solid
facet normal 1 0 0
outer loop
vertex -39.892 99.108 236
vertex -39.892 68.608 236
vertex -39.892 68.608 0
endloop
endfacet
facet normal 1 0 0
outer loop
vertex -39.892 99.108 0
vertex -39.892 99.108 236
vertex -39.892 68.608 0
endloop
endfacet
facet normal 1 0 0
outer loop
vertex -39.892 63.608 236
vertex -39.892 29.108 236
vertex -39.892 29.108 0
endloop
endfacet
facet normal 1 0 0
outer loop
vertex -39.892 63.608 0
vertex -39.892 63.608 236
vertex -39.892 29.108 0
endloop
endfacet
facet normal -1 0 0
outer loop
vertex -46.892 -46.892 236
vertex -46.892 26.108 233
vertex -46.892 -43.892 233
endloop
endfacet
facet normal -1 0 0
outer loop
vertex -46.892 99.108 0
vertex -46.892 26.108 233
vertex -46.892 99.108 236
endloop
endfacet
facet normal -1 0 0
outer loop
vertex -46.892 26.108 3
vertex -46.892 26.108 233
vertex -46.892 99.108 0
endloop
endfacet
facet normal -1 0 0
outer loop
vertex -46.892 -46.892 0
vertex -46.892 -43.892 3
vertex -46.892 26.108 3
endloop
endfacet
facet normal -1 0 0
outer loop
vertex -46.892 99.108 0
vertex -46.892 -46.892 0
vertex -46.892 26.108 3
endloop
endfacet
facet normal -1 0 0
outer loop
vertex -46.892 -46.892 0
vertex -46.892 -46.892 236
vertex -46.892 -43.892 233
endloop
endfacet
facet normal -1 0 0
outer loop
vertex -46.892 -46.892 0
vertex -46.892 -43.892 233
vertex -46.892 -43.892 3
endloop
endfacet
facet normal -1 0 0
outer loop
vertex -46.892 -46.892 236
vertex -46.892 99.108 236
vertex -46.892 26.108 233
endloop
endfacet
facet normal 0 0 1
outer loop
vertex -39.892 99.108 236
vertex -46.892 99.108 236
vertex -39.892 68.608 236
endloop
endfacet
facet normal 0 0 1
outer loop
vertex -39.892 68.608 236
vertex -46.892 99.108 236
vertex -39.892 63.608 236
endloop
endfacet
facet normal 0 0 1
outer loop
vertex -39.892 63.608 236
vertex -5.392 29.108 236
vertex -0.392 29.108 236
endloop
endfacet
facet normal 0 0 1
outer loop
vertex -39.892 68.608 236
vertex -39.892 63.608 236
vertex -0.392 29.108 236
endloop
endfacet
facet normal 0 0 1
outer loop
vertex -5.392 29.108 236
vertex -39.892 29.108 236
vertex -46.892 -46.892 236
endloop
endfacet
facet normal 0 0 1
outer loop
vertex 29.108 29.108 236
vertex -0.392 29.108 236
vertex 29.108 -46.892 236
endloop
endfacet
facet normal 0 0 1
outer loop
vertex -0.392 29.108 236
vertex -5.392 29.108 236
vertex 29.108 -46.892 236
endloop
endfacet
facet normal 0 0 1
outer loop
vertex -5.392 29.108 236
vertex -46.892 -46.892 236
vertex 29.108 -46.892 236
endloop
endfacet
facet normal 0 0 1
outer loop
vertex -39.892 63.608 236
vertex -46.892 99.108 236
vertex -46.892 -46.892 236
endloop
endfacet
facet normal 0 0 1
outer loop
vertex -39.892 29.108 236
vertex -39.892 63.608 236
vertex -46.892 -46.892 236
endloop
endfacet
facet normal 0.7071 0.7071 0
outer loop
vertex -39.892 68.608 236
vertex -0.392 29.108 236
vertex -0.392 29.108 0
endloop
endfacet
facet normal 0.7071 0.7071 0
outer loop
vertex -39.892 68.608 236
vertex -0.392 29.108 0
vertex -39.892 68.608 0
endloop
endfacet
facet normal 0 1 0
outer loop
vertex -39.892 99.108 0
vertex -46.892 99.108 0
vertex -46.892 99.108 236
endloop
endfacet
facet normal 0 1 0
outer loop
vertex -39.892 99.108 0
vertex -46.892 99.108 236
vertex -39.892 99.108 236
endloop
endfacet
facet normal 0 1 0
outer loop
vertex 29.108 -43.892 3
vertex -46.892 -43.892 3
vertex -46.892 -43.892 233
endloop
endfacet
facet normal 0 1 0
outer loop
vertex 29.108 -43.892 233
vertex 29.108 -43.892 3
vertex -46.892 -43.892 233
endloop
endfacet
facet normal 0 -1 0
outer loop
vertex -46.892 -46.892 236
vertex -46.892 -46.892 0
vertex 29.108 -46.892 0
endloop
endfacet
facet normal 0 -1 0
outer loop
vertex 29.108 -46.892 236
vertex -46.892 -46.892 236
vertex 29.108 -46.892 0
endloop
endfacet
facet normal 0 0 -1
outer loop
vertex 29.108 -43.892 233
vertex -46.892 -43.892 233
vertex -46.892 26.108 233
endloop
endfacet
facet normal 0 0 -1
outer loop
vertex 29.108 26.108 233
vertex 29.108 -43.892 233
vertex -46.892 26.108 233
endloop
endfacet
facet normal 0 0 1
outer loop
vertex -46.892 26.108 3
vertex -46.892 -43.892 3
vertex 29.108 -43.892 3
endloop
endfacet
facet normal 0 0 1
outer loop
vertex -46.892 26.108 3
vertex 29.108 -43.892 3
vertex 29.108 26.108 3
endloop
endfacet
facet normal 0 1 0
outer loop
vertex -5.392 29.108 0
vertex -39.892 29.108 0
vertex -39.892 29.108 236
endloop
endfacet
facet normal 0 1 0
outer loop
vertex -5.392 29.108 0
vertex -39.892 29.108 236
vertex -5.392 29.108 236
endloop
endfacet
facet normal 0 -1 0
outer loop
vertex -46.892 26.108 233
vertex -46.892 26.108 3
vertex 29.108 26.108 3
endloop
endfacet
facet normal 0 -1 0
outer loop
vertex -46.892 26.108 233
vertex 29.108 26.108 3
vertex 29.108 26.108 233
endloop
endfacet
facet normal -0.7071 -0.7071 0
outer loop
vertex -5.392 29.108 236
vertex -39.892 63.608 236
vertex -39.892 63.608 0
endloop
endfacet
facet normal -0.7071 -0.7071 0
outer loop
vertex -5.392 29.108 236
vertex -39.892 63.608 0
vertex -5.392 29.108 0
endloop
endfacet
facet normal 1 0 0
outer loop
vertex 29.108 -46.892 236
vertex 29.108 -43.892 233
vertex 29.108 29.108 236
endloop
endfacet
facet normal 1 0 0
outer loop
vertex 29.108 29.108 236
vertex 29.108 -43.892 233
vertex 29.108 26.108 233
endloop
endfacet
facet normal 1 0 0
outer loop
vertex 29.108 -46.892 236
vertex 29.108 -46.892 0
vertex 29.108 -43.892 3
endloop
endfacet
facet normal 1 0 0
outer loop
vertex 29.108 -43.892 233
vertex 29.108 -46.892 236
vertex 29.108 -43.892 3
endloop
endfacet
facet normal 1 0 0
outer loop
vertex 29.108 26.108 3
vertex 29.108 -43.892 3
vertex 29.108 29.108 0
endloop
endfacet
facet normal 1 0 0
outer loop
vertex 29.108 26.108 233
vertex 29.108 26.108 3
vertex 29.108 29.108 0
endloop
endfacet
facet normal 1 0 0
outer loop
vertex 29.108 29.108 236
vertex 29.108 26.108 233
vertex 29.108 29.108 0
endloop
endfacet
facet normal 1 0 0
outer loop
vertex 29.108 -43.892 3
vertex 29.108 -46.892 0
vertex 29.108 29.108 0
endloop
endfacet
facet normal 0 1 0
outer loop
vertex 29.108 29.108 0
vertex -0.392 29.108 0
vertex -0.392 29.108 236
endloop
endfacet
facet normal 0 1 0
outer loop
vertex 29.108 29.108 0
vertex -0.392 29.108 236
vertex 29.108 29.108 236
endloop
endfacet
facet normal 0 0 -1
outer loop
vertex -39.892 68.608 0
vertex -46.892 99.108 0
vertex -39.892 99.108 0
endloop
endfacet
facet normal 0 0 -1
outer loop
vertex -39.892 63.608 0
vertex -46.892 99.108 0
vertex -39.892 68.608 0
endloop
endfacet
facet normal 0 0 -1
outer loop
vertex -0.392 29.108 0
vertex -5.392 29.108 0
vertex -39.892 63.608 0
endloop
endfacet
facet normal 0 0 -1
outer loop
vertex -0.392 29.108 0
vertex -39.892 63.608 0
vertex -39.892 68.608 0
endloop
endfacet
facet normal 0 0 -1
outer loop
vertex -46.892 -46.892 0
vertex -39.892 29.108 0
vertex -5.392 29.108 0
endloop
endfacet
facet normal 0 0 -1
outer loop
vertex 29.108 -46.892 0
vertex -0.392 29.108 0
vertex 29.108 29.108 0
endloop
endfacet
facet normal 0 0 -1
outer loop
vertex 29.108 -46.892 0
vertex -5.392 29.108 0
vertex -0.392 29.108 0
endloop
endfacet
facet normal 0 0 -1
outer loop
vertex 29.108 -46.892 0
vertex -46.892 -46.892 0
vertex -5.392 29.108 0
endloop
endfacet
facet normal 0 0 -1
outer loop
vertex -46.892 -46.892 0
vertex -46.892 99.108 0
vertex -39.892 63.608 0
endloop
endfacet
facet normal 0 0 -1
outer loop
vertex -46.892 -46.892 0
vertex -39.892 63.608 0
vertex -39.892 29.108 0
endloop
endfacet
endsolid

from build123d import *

# Parameters (mm, degrees)
SKETCH_1_W          = 76
SKETCH_1_H          = 76
EXTRUDE_1_DEPTH     = 236
SKETCH_3_W          = 230
SKETCH_3_H          = 70
CUT_EXTRUDE_1_DEPTH = 130.085755737
SKETCH_4_W          = 7
SKETCH_4_H          = 236
EXTRUDE_2_DEPTH     = 70
EXTRUDE_5_DEPTH     = 236


with BuildPart() as part:
    # 草圖1 → 填料-伸長1 (new body)
    with BuildSketch(Plane.XY):
        with Locations((-8.891608392, -8.891608392)):
            Rectangle(SKETCH_1_W, SKETCH_1_H)
    extrude(amount=EXTRUDE_1_DEPTH)

    # 草圖3 → 除料-伸長1 (cut)
    with BuildSketch(Plane.ZY.offset(46.891608392)):
        with Locations((118, -8.891608392)):
            Rectangle(SKETCH_3_W, SKETCH_3_H)
    extrude(amount=-CUT_EXTRUDE_1_DEPTH, mode=Mode.SUBTRACT)

    # 草圖4 → 填料-伸長2 (add)
    with BuildSketch(Plane(origin=(0, 29.108391608, 0), x_dir=(1, 0, 0), z_dir=(0, 1, 0))):
        with Locations((-43.391608392, -118)):
            Rectangle(SKETCH_4_W, SKETCH_4_H)
    extrude(amount=EXTRUDE_2_DEPTH)

    # 草圖5 → 填料-伸長5 (add)
    with BuildSketch(Plane.XY.offset(236)):
        Polygon((-39.891608392, 63.608391608), (-5.391608392, 29.108391608), (-0.391608392, 29.108391608), (-39.891608392, 68.608391608), align=None)
    extrude(amount=-EXTRUDE_5_DEPTH)


solid = part.part
